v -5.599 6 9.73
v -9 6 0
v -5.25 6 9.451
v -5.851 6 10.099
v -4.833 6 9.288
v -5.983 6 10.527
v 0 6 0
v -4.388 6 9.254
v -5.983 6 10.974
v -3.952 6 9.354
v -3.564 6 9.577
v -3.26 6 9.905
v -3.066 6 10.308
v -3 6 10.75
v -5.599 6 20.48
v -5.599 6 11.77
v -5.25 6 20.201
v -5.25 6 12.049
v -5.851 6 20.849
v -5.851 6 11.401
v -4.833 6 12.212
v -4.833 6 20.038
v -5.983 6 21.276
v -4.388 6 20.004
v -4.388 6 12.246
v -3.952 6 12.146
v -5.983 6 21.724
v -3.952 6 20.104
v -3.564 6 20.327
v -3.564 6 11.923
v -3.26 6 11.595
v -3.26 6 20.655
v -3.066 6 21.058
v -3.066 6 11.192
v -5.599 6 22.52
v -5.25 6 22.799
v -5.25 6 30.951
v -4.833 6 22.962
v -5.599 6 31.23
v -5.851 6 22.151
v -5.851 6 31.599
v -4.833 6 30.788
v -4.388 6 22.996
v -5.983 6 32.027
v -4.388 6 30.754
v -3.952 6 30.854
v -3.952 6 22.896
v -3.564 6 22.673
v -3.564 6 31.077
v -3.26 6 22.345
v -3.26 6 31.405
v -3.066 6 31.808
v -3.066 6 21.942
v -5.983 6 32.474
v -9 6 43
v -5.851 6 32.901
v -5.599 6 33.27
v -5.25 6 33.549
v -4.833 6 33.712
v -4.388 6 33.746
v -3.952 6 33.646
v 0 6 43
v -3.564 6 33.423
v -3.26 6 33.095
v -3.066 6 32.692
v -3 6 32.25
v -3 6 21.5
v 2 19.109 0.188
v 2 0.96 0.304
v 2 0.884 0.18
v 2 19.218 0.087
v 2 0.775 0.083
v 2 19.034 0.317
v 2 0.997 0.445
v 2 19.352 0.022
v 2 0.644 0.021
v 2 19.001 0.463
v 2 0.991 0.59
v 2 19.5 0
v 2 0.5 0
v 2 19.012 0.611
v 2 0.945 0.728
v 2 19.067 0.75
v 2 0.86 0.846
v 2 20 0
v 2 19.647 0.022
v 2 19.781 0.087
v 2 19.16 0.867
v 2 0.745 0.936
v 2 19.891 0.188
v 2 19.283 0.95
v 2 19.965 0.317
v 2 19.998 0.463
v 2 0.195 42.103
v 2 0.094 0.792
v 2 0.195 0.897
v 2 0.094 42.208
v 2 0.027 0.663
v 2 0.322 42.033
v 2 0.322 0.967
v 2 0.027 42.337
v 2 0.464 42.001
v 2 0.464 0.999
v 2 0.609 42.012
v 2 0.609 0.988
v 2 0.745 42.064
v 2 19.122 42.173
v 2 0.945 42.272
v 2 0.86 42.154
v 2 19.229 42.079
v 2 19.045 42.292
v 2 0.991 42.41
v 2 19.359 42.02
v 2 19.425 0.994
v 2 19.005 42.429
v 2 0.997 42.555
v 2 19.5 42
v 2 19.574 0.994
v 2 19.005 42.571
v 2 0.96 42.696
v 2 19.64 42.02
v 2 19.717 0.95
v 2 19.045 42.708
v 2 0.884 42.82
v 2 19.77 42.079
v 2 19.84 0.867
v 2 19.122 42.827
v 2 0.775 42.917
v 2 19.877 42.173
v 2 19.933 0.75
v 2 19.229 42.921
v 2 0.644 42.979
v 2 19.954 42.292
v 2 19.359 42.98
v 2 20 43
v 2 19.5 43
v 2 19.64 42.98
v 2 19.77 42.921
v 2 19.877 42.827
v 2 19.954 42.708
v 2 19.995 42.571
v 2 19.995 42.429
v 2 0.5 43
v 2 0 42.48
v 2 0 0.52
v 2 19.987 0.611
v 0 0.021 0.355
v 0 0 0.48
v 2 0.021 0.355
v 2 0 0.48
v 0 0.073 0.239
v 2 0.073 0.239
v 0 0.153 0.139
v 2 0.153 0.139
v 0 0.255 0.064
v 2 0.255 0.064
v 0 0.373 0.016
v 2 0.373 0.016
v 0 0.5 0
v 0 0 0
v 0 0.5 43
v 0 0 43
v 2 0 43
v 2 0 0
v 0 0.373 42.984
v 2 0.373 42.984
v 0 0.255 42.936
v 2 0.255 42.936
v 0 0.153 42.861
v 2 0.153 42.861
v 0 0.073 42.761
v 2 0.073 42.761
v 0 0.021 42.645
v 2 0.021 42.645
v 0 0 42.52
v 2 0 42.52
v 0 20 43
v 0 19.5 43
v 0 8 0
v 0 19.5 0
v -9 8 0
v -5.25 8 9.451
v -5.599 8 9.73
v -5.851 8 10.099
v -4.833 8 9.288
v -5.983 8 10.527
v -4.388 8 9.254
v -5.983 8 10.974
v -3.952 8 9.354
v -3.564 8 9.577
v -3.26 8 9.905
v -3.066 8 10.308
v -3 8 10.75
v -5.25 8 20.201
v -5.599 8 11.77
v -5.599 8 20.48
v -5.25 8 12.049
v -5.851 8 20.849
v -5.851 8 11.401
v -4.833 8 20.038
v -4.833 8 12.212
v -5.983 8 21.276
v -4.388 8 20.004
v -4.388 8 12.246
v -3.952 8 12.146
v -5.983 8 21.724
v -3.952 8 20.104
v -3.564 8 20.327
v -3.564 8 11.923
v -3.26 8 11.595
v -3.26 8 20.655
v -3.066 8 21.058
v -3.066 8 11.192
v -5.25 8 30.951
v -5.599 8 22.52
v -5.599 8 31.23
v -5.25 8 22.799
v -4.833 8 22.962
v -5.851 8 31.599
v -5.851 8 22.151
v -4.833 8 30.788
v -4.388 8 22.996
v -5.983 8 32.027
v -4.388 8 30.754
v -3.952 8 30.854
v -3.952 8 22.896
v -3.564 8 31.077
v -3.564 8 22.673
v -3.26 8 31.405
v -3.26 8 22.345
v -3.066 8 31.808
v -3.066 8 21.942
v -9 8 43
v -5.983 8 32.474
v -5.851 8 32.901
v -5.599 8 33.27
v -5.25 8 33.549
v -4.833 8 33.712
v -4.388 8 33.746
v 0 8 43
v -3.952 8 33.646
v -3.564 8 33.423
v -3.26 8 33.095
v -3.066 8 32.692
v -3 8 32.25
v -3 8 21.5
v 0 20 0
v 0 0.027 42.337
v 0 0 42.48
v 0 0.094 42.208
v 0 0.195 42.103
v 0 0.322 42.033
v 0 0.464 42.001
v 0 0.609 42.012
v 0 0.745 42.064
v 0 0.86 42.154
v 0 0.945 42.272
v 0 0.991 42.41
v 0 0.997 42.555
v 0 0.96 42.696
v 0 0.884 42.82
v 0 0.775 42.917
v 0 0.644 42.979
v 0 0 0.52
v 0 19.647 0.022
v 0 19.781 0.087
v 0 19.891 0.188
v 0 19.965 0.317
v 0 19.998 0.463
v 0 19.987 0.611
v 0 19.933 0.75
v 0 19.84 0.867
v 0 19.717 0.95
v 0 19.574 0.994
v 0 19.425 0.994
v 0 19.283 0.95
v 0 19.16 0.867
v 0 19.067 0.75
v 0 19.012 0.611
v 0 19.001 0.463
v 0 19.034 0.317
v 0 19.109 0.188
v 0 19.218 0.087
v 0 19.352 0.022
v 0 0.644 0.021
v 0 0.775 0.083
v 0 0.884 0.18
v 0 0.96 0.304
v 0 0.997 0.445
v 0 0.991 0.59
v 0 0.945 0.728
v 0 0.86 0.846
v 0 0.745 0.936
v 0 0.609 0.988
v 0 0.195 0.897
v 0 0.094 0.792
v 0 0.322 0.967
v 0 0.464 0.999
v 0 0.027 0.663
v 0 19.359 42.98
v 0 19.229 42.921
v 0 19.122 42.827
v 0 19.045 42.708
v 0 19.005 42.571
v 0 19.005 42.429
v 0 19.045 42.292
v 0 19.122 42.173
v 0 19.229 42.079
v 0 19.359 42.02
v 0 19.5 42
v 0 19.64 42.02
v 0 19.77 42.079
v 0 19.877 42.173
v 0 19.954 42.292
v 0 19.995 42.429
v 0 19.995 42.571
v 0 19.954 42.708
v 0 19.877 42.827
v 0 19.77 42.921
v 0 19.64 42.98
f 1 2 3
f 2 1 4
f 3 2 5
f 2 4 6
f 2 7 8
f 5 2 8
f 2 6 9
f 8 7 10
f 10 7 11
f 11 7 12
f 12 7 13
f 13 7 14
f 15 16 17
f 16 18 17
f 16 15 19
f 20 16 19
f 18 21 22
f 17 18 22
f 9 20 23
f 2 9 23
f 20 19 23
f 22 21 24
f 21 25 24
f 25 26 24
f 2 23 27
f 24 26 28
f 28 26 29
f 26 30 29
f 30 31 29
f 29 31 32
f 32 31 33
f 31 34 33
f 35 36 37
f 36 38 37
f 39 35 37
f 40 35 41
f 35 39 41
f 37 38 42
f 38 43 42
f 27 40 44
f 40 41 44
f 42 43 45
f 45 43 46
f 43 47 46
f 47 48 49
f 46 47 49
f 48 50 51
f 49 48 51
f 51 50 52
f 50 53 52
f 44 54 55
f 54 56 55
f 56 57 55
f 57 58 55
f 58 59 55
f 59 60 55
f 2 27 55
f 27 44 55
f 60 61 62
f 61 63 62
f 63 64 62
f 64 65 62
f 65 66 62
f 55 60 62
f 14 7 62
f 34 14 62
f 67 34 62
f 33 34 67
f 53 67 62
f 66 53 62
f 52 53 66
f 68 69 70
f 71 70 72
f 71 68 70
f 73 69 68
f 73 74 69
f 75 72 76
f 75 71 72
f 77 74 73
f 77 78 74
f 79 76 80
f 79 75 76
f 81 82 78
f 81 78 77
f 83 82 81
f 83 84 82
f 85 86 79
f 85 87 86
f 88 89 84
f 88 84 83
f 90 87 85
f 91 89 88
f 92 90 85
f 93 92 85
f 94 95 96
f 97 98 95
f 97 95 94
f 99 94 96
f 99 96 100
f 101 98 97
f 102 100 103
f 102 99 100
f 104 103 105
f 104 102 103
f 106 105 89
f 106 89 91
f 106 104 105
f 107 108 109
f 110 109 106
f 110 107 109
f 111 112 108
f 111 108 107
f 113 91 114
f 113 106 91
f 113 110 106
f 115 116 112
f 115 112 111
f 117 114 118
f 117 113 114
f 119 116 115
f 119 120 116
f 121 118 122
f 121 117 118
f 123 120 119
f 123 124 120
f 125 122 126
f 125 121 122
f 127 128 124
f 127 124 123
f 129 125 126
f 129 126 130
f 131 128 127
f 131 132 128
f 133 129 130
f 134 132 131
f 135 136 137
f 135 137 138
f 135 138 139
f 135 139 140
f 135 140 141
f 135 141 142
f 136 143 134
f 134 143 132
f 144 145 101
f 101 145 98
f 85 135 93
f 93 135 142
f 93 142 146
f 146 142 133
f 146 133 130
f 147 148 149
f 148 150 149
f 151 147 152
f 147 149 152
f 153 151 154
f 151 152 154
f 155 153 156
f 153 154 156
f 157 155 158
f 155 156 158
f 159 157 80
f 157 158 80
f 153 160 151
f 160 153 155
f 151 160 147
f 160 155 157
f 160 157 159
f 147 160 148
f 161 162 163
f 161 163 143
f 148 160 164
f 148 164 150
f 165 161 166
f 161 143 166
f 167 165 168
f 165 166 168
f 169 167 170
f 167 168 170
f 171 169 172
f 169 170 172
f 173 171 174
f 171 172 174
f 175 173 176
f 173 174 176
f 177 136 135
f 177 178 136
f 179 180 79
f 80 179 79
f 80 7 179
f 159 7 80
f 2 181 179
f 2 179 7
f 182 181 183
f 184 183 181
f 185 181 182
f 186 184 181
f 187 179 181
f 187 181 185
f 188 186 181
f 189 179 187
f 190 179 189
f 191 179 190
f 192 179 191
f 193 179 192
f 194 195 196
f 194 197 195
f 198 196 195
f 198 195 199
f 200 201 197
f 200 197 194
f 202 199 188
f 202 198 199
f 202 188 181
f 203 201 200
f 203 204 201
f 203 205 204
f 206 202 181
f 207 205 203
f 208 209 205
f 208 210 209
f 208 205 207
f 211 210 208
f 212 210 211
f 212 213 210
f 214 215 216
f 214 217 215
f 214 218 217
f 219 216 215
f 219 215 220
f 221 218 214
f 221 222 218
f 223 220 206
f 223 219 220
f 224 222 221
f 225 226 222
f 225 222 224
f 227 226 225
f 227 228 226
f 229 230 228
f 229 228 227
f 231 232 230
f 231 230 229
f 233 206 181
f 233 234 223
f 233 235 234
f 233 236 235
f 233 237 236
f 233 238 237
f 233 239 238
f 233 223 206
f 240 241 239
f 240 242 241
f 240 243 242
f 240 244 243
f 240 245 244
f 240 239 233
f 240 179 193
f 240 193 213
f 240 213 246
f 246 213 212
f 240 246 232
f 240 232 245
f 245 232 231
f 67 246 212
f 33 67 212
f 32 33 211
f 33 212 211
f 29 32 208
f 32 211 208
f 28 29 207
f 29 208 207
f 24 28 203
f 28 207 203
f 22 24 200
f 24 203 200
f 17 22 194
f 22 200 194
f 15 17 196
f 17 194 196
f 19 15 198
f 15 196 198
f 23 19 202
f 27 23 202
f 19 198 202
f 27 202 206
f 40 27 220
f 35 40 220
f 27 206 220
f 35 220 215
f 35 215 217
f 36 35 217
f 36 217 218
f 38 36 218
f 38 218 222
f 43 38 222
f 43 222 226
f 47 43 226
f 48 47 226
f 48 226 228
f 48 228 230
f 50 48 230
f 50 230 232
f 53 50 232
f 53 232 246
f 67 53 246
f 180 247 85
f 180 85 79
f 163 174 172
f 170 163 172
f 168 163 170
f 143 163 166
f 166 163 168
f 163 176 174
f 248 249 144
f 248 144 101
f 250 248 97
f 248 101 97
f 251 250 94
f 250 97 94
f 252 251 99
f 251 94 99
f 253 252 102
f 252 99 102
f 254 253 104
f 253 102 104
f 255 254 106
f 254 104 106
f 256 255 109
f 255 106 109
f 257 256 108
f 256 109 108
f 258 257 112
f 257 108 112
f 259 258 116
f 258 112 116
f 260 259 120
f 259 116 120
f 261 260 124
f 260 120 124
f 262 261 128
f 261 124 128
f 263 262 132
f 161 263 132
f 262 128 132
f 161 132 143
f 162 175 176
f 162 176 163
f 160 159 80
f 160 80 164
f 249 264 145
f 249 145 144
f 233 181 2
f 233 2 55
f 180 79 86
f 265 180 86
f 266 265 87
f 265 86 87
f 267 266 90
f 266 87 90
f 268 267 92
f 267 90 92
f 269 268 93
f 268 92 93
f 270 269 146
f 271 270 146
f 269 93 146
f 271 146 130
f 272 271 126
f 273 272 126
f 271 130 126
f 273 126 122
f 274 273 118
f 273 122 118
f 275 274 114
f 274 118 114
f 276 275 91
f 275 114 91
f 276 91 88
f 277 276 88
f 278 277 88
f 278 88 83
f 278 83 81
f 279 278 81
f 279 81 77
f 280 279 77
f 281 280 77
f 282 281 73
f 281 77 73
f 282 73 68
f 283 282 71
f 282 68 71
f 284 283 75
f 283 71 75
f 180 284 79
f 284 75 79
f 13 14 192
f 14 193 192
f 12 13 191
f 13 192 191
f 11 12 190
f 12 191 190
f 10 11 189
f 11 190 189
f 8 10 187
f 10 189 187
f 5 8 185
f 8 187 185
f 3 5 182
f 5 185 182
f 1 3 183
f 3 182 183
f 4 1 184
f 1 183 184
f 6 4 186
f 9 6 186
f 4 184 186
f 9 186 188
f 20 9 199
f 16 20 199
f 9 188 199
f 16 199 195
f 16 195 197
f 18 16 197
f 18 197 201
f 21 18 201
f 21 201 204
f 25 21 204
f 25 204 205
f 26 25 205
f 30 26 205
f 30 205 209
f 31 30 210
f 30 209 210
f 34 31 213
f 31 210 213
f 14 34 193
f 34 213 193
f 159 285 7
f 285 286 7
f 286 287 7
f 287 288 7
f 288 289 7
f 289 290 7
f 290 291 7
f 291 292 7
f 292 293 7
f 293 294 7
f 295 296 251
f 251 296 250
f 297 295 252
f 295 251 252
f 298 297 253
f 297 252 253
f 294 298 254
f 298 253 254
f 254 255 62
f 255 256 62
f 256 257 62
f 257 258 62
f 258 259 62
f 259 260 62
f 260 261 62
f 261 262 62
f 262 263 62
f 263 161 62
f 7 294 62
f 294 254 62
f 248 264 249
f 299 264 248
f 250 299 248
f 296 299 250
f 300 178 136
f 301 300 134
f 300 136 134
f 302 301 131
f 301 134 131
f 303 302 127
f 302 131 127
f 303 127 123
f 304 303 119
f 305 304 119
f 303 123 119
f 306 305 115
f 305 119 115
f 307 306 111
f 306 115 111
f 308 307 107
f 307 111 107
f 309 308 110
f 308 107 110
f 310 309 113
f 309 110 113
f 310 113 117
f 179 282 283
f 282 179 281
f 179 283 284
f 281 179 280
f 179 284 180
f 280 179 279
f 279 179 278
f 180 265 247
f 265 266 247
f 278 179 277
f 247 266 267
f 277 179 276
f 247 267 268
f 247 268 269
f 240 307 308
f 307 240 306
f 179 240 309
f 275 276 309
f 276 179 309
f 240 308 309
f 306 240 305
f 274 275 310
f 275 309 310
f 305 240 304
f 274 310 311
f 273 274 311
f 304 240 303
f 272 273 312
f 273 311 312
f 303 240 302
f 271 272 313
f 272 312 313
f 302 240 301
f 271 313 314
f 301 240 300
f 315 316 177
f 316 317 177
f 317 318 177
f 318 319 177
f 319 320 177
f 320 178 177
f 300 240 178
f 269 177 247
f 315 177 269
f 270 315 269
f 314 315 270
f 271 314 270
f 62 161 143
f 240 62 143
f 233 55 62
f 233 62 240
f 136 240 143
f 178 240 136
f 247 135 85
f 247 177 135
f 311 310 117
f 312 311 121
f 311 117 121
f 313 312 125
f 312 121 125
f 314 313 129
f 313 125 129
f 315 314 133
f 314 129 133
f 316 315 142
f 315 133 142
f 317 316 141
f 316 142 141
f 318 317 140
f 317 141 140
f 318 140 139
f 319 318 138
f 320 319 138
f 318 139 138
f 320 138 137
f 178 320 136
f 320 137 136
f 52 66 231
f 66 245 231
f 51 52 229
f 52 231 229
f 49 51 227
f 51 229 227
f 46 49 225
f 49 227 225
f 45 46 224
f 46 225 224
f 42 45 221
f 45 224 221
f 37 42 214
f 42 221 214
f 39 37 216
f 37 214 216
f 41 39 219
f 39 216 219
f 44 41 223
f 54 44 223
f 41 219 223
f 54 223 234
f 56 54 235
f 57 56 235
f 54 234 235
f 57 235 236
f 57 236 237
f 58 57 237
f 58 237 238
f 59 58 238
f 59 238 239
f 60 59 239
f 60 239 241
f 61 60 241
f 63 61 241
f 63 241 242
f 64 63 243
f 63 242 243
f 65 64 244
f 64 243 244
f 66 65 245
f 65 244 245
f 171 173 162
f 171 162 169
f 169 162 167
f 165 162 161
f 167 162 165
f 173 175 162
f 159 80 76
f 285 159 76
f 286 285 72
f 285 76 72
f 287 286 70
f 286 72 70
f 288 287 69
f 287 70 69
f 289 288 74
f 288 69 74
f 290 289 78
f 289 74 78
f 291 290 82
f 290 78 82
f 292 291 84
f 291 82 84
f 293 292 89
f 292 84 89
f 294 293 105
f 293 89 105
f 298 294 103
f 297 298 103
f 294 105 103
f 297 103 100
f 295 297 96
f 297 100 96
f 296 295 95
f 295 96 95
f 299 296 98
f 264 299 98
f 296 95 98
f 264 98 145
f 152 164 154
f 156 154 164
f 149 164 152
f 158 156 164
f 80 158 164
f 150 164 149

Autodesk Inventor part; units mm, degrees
ref_plane "YZ Plane" through (0, 0, 0) normal (1, 0, 0) x (0, 1, 0)
ref_plane "XZ Plane" through (0, 0, 0) normal (0, 1, 0) x (-1, 0, 0)
ref_plane "XY Plane" through (0, 0, 0) normal (0, 0, 1) x (1, 0, 0)
sketch "Esboço1" plane through (0, 0, 0) normal (1, 0, 0) x (0, 1, 0)
  line L0 (0, 0) -> (0, 43)
  line L1 (0, 43) -> (20, 43)
  line L2 (20, 43) -> (20, 0)
  line L3 (20, 0) -> (0, 0)
  dimension "d0" = 43
  dimension "d1" = 20
extrude "Extrusão1" add sketch "Esboço1" along normal blind 2
sketch "Esboço2" plane through (2, 0, 0) normal (1, 0, 0) x (0, 0, -1)
  line L0 (-43, 20) -> (-43, 0) projected
  line L1 (-43, 0) -> (0, 0) projected
  circle A0 centre (-0.5, 0.4996) radius 0.5
  circle A1 centre (-0.5, 19.4996) radius 0.5
  circle A2 centre (-42.5, 19.4996) radius 0.5
  circle A3 centre (-42.5, 0.4996) radius 0.5
  point P0 (-42.4796, 0)
  point P1 (-42.5204, 0)
  dimension "d12" = 1
  dimension "d13" = 1
  dimension "d14" = 1
  dimension "d15" = 1
extrude "Extrusão2" cut sketch "Esboço2" against normal through all contours A0 | A3 | A2 | A1
sketch "Esboço6" plane through (0, 20, 0) normal (-1, 0, 0) x (0, 0, 1)
  line L0 (0, 0) -> (43, 0) projected
  line L1 (11.5781, -12) -> (0, -12)
  line L2 (0, -19.5004) -> (0, -0.5004) projected
  line L3 (11.5781, -14) -> (0, -14)
  line L4 (0, -12) -> (0, -14)
  line L5 (11.5781, -12) -> (43, -12)
  line L6 (43, -12) -> (43, -14)
  line L7 (43, -0.5004) -> (43, -19.5004) projected
  line L8 (11.5781, -14) -> (43, -14)
  point P0 (0, -20)
  dimension "d36" = 2
extrude "Extrusão5" add sketch "Esboço6" along normal blind 9
sketch "Esboço8" plane through (0, 8, 43) normal (0, 1, 0) x (1, 0, 0)
  line L0 (-9, 0) -> (-9, 43) projected
  line L1 (0, 43) -> (-9, 43) projected
  line L2 (0, 43) -> (0, 0) projected
  circle A0 centre (-4.4997, 32.2499) radius 1.5
  circle A1 centre (-4.4997, 21.5) radius 1.5
  circle A2 centre (-4.4997, 10.7499) radius 1.5
  dimension "d53" = 3
  dimension "d54" = 3
  dimension "d55" = 3
sketch "Esboço9" plane through (0, 20, 43) normal (0, 1, 0) x (1, 0, 0)
  point P0 (0, 43)
extrude "Extrusão7" cut sketch "Esboço8" against normal up to next
properties part number "ultrassom"
